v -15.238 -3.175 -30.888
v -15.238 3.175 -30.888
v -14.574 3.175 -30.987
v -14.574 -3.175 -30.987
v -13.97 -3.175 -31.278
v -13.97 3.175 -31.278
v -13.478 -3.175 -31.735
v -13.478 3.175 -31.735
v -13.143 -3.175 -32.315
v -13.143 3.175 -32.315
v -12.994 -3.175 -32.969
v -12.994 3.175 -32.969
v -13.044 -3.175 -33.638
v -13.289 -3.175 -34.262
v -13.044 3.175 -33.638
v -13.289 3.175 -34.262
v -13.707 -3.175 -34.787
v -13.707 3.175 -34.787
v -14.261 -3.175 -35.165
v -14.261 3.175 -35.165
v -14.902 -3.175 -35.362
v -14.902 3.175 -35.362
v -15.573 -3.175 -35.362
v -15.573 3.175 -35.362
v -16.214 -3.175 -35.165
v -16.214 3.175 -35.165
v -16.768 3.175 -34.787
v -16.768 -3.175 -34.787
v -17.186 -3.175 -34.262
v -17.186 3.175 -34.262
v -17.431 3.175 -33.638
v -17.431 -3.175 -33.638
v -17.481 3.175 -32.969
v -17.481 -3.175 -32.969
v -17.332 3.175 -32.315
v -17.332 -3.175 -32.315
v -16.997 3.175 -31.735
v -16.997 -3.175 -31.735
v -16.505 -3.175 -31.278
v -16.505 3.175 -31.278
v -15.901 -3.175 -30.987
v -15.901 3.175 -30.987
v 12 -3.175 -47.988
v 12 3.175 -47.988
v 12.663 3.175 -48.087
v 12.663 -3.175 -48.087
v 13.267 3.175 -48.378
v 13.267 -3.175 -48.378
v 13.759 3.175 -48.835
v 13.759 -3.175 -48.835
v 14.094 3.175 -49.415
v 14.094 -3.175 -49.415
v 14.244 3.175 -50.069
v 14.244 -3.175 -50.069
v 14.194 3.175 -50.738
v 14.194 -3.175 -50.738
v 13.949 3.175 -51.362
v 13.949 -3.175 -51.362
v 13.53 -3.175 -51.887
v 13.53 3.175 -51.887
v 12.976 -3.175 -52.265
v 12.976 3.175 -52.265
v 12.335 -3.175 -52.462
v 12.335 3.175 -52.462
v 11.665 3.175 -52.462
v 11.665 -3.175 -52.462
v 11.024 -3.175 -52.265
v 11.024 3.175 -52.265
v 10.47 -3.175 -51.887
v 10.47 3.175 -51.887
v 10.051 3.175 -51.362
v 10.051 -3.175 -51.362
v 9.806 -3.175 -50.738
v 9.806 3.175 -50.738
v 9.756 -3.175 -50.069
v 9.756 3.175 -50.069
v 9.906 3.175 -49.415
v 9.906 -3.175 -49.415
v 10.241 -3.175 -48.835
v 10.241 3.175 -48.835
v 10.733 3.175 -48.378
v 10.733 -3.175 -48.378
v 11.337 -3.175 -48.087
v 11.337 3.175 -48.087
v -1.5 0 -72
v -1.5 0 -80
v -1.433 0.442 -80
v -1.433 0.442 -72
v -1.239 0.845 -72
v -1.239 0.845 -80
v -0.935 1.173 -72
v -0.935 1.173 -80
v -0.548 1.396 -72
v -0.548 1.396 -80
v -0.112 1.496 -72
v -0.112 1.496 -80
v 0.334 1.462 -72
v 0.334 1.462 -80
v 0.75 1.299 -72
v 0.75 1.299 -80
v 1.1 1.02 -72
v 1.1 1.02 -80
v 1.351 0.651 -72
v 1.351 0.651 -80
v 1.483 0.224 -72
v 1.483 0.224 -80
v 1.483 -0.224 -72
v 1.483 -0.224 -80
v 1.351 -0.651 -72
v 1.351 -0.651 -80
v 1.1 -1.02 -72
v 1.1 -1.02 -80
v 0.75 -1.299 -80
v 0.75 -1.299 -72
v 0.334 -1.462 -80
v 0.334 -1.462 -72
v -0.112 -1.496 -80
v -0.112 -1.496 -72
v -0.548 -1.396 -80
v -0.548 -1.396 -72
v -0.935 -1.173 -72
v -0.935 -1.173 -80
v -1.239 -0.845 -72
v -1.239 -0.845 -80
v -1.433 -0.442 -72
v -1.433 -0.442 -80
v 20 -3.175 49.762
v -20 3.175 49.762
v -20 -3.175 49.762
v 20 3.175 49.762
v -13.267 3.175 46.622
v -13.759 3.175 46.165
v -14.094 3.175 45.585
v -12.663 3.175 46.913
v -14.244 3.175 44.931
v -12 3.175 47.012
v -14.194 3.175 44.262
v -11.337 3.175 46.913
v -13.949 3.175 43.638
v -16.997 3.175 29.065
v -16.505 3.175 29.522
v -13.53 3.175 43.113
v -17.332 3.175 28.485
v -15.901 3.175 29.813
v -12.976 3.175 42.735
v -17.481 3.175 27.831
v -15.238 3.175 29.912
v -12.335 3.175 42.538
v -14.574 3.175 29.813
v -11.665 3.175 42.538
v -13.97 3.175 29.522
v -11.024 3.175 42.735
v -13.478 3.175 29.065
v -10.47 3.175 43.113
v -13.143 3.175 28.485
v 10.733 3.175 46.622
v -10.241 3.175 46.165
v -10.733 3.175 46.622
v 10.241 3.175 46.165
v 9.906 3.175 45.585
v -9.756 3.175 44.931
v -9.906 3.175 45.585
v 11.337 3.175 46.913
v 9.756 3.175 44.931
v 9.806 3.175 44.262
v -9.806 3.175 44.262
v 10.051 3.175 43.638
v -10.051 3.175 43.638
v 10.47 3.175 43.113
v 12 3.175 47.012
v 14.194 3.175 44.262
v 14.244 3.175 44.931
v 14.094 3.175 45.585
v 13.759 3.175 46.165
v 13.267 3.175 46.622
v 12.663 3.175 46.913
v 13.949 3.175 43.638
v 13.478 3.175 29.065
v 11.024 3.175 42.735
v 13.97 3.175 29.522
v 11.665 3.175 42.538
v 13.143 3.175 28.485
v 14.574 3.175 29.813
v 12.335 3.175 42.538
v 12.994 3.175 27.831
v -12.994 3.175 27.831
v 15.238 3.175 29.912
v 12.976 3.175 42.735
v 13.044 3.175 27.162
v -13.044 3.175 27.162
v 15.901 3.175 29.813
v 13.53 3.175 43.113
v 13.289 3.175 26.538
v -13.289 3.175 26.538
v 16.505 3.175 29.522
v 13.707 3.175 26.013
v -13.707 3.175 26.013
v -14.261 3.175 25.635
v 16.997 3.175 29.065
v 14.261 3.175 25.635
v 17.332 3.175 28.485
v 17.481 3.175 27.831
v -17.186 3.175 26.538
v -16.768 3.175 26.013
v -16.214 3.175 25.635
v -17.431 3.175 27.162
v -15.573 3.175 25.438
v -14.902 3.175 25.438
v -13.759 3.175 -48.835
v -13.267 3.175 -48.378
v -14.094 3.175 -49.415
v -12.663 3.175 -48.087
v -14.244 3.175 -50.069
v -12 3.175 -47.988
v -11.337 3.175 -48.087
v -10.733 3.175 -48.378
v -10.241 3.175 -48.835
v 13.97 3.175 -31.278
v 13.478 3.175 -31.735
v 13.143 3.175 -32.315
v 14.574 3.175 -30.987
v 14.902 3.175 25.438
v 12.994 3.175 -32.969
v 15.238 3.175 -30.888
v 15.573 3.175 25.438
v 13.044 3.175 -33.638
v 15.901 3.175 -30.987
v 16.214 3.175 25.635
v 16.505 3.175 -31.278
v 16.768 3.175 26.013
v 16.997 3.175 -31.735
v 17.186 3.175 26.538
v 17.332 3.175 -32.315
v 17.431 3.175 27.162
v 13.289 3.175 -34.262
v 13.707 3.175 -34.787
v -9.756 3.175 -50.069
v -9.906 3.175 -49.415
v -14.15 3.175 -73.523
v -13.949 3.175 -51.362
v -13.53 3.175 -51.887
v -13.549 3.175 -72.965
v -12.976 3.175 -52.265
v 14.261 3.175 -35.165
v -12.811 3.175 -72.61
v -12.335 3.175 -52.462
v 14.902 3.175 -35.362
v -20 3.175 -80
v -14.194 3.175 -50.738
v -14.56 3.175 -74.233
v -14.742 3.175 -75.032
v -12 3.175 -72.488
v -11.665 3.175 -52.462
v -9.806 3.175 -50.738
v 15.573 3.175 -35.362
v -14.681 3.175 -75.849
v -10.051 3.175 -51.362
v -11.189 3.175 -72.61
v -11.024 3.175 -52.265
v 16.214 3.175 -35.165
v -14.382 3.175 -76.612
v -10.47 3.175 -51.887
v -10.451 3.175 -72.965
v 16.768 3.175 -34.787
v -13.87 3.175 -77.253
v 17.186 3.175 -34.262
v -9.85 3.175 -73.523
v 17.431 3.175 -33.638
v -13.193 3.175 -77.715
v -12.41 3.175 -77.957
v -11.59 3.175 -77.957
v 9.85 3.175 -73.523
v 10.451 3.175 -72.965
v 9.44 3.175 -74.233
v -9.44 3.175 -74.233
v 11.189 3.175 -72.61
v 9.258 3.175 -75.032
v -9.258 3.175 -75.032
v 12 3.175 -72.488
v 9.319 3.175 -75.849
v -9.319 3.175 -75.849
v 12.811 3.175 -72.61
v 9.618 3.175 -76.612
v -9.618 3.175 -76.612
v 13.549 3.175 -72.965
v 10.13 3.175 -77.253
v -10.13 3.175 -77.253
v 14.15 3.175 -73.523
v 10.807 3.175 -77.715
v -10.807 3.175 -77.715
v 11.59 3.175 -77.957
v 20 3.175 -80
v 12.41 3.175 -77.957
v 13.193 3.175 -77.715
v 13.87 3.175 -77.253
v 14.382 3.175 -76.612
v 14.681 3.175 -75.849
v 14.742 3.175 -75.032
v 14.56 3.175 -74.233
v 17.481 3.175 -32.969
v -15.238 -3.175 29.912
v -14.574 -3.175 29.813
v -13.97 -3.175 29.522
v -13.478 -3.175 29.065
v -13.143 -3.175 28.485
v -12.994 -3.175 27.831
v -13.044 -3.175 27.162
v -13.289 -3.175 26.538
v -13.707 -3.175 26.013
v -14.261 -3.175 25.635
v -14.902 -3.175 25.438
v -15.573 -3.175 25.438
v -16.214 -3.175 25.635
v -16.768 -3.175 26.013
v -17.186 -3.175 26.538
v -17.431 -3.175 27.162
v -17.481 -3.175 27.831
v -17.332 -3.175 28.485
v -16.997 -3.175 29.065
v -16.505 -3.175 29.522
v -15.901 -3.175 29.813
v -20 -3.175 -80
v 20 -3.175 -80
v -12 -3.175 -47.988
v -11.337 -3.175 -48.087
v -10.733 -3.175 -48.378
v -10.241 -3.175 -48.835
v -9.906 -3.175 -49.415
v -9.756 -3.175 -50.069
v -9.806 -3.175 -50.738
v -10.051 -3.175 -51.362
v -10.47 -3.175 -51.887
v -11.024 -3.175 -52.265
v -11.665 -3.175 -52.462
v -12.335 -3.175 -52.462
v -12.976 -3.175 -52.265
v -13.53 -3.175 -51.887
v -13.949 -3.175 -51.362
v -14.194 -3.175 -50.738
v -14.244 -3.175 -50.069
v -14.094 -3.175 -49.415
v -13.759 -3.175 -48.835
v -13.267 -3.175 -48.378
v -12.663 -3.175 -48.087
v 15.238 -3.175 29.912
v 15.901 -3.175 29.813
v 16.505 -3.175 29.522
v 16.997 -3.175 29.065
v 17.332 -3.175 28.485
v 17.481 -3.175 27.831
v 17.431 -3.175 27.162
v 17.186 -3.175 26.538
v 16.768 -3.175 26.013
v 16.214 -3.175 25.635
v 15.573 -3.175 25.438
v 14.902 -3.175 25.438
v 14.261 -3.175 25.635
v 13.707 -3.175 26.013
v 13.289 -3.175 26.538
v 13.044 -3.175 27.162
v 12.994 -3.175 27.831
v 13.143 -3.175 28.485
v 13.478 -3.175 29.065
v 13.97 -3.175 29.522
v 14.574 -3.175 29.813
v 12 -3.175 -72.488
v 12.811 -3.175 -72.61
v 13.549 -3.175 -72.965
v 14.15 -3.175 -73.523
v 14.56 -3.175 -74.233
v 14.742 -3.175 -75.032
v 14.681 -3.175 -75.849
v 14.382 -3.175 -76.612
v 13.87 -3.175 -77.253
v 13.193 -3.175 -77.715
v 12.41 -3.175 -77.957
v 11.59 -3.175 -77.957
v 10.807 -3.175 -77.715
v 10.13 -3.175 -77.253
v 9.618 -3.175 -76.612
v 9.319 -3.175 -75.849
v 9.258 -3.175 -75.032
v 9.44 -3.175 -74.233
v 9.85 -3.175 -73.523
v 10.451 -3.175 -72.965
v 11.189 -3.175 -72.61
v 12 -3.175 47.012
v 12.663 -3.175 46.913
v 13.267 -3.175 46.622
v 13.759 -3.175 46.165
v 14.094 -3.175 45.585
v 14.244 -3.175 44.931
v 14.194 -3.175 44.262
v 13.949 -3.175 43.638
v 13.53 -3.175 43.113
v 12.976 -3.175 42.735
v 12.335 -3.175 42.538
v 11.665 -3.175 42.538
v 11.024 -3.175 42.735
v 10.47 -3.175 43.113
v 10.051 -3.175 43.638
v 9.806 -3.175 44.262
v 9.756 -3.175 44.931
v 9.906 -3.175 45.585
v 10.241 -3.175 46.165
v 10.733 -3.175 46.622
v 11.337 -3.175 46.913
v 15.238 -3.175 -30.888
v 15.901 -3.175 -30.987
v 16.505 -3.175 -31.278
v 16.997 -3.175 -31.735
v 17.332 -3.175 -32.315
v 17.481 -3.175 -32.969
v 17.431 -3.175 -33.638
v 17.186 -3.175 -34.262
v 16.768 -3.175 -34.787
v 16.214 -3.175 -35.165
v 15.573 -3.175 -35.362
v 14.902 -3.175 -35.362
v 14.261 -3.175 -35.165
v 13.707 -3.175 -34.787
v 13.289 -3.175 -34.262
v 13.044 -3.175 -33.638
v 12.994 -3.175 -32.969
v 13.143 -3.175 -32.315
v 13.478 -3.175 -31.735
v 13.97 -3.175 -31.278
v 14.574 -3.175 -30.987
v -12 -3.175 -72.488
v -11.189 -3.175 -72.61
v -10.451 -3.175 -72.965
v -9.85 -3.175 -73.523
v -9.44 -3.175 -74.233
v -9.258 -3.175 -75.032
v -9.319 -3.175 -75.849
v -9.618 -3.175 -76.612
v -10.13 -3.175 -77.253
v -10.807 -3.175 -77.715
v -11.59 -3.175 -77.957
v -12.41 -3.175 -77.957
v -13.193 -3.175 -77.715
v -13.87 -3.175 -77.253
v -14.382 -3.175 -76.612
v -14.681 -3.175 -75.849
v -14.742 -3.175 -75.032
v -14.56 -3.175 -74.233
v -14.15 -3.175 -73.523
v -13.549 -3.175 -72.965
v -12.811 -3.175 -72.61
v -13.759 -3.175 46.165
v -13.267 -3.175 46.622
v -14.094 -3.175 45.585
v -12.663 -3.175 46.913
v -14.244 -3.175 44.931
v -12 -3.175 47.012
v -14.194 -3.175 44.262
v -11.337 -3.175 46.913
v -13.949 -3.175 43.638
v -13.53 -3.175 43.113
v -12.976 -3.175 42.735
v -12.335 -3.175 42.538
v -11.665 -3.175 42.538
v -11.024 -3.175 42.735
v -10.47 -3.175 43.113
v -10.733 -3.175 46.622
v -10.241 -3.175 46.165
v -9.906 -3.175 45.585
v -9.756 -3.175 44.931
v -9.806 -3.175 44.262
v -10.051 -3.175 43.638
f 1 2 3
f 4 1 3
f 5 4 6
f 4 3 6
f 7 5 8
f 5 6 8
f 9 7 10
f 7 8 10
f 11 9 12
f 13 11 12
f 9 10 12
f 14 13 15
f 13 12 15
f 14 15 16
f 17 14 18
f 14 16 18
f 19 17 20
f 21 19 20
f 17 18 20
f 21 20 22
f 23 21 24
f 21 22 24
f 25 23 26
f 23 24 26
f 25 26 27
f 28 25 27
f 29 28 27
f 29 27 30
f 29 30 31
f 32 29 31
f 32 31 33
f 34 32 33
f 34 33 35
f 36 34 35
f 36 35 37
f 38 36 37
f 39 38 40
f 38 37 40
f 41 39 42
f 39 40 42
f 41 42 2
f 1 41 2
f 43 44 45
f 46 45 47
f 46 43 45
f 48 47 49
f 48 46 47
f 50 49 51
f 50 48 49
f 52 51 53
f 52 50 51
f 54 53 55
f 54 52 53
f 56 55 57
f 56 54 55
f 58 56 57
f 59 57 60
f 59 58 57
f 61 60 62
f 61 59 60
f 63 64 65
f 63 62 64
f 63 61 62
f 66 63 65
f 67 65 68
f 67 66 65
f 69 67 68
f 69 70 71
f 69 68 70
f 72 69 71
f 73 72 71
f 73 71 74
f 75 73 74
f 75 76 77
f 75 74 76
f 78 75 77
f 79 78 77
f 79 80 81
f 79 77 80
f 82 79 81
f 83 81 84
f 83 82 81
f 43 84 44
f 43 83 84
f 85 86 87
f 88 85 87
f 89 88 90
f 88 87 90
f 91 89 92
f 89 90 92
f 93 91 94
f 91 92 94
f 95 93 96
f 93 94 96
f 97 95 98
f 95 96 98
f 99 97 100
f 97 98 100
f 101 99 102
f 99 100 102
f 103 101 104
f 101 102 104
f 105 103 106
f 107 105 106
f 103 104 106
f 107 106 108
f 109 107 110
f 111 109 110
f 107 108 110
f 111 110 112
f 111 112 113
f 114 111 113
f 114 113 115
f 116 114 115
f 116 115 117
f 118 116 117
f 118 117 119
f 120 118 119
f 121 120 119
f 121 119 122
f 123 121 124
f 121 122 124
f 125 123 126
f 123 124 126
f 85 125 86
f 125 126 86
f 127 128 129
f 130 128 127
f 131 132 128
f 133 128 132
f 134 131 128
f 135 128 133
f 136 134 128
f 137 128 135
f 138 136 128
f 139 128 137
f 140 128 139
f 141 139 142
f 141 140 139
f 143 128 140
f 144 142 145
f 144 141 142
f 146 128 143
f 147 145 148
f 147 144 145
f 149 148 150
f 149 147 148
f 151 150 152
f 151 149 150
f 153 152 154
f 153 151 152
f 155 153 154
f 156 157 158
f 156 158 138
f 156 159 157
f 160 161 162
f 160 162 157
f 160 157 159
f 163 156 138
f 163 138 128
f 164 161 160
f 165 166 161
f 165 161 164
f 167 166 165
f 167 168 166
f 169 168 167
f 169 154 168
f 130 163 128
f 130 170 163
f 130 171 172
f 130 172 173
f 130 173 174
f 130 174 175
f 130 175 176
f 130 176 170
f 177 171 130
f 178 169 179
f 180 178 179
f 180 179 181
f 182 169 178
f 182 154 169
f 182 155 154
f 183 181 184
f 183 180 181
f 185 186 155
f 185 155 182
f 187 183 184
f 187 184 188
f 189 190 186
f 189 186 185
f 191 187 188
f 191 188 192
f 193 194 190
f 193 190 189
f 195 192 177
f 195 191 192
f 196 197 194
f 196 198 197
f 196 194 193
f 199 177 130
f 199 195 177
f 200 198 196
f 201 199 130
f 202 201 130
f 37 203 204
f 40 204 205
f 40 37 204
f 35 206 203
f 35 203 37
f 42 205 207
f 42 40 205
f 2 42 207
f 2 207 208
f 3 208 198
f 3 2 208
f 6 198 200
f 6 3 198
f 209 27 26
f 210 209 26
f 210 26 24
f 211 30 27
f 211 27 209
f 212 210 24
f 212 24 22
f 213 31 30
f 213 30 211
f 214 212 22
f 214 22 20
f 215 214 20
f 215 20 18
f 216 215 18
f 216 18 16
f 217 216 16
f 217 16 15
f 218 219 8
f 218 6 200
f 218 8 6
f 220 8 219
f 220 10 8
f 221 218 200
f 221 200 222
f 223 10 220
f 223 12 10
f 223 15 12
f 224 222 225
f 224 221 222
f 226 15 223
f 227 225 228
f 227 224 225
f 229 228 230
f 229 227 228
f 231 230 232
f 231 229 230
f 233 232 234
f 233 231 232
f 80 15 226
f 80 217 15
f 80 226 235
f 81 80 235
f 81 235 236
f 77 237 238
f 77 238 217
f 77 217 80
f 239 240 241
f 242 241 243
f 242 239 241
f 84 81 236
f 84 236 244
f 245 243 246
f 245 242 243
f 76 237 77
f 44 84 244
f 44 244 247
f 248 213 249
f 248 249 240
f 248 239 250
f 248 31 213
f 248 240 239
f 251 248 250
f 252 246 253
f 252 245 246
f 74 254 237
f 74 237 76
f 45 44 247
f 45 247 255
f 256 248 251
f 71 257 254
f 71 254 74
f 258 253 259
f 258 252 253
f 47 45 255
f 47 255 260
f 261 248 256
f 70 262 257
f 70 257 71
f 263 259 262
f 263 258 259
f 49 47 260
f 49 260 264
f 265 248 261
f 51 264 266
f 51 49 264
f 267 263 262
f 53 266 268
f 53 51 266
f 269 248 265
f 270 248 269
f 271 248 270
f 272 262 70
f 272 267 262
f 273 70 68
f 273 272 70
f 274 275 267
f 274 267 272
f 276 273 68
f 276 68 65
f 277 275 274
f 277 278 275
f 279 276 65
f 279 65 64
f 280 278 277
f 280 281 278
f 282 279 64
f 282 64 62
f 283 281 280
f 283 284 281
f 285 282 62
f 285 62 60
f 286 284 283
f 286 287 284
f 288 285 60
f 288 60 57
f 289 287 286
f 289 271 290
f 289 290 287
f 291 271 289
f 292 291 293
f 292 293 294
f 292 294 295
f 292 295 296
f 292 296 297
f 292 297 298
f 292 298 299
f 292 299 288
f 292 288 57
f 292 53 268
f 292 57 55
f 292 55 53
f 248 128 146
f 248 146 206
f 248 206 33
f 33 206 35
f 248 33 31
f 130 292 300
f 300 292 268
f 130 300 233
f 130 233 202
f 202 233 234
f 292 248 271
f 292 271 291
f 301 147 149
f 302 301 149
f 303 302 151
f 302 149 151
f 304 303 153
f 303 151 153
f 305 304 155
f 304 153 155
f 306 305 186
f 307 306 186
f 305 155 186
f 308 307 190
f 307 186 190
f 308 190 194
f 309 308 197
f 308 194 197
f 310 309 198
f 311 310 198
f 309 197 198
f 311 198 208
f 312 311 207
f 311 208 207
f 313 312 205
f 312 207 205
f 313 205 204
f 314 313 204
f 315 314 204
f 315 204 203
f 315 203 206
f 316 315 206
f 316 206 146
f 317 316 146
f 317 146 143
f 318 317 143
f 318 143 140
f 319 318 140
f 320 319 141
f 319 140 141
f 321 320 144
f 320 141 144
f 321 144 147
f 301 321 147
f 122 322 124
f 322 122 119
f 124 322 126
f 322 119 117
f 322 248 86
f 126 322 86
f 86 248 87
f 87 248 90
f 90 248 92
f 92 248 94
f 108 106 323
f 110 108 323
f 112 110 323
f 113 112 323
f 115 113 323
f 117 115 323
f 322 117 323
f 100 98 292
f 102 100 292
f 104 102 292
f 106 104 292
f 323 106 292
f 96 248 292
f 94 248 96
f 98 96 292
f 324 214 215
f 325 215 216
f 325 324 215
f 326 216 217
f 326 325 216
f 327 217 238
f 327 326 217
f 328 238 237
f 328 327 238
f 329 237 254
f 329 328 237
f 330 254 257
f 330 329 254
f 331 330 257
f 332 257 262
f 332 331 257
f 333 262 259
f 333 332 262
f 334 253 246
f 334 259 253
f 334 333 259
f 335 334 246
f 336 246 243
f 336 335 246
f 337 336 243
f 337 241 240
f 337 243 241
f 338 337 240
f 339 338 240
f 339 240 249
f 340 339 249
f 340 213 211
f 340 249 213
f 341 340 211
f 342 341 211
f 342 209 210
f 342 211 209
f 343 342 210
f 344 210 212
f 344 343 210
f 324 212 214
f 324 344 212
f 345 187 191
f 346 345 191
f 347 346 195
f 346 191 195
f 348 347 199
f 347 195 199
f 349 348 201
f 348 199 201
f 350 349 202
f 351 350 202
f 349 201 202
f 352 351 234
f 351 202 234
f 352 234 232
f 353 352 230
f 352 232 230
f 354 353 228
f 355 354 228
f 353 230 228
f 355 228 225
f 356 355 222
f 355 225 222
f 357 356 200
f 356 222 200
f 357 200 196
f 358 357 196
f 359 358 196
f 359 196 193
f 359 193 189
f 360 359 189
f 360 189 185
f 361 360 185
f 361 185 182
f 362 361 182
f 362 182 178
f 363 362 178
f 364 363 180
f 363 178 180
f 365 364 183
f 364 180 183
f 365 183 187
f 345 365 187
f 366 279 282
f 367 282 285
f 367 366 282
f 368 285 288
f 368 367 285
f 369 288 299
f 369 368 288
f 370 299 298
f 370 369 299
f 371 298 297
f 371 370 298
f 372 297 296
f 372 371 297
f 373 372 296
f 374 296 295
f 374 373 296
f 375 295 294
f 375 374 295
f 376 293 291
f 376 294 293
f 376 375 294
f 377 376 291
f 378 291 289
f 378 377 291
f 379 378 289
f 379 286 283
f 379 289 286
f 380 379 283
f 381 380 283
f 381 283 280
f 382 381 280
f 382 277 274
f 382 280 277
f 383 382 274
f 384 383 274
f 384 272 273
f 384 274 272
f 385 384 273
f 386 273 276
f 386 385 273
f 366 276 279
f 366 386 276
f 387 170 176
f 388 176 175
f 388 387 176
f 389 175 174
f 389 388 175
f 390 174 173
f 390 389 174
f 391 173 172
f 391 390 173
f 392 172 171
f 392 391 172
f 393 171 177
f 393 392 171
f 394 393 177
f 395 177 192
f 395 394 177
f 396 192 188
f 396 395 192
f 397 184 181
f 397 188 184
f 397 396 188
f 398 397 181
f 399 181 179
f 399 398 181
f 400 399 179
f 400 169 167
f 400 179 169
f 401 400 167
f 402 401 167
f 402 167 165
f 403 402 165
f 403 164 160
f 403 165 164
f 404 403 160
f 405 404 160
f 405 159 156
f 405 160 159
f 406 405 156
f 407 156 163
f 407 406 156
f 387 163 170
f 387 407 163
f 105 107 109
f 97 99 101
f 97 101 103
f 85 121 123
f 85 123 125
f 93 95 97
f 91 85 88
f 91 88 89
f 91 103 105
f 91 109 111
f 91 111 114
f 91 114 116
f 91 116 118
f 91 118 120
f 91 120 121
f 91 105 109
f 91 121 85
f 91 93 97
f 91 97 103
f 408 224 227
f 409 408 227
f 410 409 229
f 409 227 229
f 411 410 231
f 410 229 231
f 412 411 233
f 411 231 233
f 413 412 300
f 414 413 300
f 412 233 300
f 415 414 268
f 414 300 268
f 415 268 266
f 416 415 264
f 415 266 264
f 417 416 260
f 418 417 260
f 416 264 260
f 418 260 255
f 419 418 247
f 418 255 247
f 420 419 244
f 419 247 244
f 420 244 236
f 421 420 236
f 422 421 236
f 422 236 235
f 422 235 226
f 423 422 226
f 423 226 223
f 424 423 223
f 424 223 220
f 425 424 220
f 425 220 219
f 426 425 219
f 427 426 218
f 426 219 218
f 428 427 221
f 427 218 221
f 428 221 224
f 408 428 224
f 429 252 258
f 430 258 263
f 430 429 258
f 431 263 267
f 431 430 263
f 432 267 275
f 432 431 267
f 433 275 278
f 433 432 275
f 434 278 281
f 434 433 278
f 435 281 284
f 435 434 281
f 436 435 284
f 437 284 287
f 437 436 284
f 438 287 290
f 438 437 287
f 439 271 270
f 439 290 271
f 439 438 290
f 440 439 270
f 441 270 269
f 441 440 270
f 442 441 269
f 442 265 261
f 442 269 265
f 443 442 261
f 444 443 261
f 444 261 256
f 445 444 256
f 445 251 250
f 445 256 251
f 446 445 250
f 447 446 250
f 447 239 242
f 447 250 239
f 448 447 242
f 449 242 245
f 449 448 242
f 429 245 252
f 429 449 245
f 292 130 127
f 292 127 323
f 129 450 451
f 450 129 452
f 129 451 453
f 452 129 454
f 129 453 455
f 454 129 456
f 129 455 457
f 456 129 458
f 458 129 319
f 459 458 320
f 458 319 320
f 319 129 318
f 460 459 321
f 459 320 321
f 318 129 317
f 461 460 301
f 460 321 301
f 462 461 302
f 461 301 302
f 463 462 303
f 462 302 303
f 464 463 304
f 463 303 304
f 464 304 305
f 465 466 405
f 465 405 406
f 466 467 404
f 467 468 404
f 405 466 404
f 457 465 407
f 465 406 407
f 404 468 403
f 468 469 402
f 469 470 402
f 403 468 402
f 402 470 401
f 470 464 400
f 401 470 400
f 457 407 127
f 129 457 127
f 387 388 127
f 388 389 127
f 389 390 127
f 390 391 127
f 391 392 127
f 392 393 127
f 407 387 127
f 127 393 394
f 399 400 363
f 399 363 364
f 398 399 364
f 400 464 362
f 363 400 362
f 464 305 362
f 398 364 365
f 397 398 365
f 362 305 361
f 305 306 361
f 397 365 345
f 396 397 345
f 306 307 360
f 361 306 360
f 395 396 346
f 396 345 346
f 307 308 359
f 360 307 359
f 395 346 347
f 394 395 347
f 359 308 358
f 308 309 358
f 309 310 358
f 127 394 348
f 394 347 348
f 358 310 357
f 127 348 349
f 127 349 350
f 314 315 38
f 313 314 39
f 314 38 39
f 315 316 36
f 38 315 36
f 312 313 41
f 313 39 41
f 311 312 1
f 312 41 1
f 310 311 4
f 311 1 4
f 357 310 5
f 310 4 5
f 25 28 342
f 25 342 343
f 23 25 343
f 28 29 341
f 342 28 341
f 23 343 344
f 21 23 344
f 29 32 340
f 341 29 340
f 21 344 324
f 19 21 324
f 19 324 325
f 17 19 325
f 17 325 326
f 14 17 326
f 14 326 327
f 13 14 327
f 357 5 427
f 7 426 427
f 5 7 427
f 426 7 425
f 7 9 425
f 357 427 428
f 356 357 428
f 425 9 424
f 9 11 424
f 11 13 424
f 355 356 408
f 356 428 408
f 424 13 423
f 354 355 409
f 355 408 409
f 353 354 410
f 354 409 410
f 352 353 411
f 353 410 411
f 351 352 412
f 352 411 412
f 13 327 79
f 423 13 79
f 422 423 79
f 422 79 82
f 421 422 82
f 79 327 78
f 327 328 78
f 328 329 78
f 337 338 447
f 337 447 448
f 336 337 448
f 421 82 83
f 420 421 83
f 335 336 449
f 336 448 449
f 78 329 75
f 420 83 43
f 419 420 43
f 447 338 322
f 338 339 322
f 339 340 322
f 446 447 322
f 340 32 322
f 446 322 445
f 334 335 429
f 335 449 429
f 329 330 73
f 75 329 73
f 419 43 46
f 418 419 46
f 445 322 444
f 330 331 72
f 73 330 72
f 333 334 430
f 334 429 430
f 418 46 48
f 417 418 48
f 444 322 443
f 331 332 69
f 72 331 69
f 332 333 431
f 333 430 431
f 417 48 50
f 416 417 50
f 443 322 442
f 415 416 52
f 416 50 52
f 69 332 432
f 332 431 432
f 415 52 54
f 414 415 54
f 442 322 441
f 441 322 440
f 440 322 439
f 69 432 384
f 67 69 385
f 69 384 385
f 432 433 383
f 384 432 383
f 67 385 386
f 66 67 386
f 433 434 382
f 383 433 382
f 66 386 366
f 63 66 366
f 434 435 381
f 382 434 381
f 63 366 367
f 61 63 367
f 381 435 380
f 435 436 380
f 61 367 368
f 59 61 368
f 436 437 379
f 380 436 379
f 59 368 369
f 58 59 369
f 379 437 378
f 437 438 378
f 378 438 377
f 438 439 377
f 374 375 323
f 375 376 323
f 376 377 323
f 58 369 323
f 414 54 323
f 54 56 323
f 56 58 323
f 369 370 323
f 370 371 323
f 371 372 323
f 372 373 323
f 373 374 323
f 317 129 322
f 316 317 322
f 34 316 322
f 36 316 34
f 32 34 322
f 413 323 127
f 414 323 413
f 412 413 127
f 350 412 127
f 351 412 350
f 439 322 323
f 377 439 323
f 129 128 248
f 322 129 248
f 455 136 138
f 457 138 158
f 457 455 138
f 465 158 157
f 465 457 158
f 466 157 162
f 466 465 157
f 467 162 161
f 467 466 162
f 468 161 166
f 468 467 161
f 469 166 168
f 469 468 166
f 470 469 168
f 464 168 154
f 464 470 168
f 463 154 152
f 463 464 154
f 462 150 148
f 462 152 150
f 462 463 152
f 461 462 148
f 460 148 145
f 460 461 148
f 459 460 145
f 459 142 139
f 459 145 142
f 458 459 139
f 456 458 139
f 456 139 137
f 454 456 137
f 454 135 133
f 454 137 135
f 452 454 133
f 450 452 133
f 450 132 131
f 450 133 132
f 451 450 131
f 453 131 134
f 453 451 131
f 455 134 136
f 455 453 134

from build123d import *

# Parameters (mm, degrees)
SKETCH1_W               = 40
SKETCH1_H               = 160
BOSS_EXTRUDE1_DEPTH     = 3.175
M4_5_THROUGH_DEPTH      = 6.35
M4_5_THROUGH_DEPTH_BACK = 3.175
SKETCH3_R               = 2.75
SKETCH3_R_2             = 2.25
SKETCH4_R               = 1.5
M3_DRILL_DEPTH          = 8
SKETCH5_R               = 2.25
M4_THROUGH_DEPTH        = 6.35
SKETCH6_W               = 40
SKETCH6_H               = 30.2375
CUT_EXTRUDE1_DEPTH      = 6.35


with BuildPart() as part:
    # Sketch1 → Boss-Extrude1 (new, symmetric)
    with BuildSketch(Plane(origin=(0, 0, 0), x_dir=(1, 0, 0), z_dir=(0, 1, 0))):
        Rectangle(SKETCH1_W, SKETCH1_H)
    extrude(amount=BOSS_EXTRUDE1_DEPTH, both=True)

    # Sketch3 → M4/5_through (cut, two sides: drawn at the far end of the back side and taken through both)
    with BuildSketch(Plane(origin=(0, 0, 0), x_dir=(1, 0, 0), z_dir=(0, 1, 0)).offset(-M4_5_THROUGH_DEPTH_BACK)):
        with Locations(Location((12, 75.2375, 0), (0, 0, 270))):
            Circle(SKETCH3_R)
        with Locations(Location((12, 50.2375, 0), (0, 0, 270))):
            Circle(SKETCH3_R_2)
        with Locations(Location((-12, 50.2375, 0), (0, 0, 270))):
            Circle(SKETCH3_R_2)
        with Locations(Location((-12, 75.2375, 0), (0, 0, 270))):
            Circle(SKETCH3_R)
        with Locations(Location((-12, -44.7625, 0), (0, 0, 270))):
            Circle(SKETCH3_R_2)
        with Locations(Location((12, -44.7625, 0), (0, 0, 270))):
            Circle(SKETCH3_R_2)
    extrude(amount=M4_5_THROUGH_DEPTH + M4_5_THROUGH_DEPTH_BACK, mode=Mode.SUBTRACT)

    # Sketch4 → M3_DRILL (cut)
    with BuildSketch(Plane(origin=(0, 0, -80), x_dir=(-1, 0, 0), z_dir=(0, 0, -1))):
        Circle(SKETCH4_R)
    extrude(amount=-M3_DRILL_DEPTH, mode=Mode.SUBTRACT)

    # Sketch5 → M4_through (cut)
    with BuildSketch(Plane(origin=(0, 3.175, 0), x_dir=(1, 0, 0), z_dir=(0, 1, 0))):
        with Locations(Location((-15.2375, -27.6625, 0), (0, 0, 270))):
            Circle(SKETCH5_R)
        with Locations(Location((15.2375, -27.6625, 0), (0, 0, 270))):
            Circle(SKETCH5_R)
        with Locations(Location((15.2375, 33.1375, 0), (0, 0, 270))):
            Circle(SKETCH5_R)
        with Locations(Location((-15.2375, 33.1375, 0), (0, 0, 270))):
            Circle(SKETCH5_R)
    extrude(amount=-M4_THROUGH_DEPTH, mode=Mode.SUBTRACT)

    # Sketch6 → Cut-Extrude1 (cut)
    with BuildSketch(Plane(origin=(0, 3.175, 0), x_dir=(1, 0, 0), z_dir=(0, 1, 0))):
        with Locations((0, -64.88125)):
            Rectangle(SKETCH6_W, SKETCH6_H)
    extrude(amount=-CUT_EXTRUDE1_DEPTH, mode=Mode.SUBTRACT)


solid = part.part
